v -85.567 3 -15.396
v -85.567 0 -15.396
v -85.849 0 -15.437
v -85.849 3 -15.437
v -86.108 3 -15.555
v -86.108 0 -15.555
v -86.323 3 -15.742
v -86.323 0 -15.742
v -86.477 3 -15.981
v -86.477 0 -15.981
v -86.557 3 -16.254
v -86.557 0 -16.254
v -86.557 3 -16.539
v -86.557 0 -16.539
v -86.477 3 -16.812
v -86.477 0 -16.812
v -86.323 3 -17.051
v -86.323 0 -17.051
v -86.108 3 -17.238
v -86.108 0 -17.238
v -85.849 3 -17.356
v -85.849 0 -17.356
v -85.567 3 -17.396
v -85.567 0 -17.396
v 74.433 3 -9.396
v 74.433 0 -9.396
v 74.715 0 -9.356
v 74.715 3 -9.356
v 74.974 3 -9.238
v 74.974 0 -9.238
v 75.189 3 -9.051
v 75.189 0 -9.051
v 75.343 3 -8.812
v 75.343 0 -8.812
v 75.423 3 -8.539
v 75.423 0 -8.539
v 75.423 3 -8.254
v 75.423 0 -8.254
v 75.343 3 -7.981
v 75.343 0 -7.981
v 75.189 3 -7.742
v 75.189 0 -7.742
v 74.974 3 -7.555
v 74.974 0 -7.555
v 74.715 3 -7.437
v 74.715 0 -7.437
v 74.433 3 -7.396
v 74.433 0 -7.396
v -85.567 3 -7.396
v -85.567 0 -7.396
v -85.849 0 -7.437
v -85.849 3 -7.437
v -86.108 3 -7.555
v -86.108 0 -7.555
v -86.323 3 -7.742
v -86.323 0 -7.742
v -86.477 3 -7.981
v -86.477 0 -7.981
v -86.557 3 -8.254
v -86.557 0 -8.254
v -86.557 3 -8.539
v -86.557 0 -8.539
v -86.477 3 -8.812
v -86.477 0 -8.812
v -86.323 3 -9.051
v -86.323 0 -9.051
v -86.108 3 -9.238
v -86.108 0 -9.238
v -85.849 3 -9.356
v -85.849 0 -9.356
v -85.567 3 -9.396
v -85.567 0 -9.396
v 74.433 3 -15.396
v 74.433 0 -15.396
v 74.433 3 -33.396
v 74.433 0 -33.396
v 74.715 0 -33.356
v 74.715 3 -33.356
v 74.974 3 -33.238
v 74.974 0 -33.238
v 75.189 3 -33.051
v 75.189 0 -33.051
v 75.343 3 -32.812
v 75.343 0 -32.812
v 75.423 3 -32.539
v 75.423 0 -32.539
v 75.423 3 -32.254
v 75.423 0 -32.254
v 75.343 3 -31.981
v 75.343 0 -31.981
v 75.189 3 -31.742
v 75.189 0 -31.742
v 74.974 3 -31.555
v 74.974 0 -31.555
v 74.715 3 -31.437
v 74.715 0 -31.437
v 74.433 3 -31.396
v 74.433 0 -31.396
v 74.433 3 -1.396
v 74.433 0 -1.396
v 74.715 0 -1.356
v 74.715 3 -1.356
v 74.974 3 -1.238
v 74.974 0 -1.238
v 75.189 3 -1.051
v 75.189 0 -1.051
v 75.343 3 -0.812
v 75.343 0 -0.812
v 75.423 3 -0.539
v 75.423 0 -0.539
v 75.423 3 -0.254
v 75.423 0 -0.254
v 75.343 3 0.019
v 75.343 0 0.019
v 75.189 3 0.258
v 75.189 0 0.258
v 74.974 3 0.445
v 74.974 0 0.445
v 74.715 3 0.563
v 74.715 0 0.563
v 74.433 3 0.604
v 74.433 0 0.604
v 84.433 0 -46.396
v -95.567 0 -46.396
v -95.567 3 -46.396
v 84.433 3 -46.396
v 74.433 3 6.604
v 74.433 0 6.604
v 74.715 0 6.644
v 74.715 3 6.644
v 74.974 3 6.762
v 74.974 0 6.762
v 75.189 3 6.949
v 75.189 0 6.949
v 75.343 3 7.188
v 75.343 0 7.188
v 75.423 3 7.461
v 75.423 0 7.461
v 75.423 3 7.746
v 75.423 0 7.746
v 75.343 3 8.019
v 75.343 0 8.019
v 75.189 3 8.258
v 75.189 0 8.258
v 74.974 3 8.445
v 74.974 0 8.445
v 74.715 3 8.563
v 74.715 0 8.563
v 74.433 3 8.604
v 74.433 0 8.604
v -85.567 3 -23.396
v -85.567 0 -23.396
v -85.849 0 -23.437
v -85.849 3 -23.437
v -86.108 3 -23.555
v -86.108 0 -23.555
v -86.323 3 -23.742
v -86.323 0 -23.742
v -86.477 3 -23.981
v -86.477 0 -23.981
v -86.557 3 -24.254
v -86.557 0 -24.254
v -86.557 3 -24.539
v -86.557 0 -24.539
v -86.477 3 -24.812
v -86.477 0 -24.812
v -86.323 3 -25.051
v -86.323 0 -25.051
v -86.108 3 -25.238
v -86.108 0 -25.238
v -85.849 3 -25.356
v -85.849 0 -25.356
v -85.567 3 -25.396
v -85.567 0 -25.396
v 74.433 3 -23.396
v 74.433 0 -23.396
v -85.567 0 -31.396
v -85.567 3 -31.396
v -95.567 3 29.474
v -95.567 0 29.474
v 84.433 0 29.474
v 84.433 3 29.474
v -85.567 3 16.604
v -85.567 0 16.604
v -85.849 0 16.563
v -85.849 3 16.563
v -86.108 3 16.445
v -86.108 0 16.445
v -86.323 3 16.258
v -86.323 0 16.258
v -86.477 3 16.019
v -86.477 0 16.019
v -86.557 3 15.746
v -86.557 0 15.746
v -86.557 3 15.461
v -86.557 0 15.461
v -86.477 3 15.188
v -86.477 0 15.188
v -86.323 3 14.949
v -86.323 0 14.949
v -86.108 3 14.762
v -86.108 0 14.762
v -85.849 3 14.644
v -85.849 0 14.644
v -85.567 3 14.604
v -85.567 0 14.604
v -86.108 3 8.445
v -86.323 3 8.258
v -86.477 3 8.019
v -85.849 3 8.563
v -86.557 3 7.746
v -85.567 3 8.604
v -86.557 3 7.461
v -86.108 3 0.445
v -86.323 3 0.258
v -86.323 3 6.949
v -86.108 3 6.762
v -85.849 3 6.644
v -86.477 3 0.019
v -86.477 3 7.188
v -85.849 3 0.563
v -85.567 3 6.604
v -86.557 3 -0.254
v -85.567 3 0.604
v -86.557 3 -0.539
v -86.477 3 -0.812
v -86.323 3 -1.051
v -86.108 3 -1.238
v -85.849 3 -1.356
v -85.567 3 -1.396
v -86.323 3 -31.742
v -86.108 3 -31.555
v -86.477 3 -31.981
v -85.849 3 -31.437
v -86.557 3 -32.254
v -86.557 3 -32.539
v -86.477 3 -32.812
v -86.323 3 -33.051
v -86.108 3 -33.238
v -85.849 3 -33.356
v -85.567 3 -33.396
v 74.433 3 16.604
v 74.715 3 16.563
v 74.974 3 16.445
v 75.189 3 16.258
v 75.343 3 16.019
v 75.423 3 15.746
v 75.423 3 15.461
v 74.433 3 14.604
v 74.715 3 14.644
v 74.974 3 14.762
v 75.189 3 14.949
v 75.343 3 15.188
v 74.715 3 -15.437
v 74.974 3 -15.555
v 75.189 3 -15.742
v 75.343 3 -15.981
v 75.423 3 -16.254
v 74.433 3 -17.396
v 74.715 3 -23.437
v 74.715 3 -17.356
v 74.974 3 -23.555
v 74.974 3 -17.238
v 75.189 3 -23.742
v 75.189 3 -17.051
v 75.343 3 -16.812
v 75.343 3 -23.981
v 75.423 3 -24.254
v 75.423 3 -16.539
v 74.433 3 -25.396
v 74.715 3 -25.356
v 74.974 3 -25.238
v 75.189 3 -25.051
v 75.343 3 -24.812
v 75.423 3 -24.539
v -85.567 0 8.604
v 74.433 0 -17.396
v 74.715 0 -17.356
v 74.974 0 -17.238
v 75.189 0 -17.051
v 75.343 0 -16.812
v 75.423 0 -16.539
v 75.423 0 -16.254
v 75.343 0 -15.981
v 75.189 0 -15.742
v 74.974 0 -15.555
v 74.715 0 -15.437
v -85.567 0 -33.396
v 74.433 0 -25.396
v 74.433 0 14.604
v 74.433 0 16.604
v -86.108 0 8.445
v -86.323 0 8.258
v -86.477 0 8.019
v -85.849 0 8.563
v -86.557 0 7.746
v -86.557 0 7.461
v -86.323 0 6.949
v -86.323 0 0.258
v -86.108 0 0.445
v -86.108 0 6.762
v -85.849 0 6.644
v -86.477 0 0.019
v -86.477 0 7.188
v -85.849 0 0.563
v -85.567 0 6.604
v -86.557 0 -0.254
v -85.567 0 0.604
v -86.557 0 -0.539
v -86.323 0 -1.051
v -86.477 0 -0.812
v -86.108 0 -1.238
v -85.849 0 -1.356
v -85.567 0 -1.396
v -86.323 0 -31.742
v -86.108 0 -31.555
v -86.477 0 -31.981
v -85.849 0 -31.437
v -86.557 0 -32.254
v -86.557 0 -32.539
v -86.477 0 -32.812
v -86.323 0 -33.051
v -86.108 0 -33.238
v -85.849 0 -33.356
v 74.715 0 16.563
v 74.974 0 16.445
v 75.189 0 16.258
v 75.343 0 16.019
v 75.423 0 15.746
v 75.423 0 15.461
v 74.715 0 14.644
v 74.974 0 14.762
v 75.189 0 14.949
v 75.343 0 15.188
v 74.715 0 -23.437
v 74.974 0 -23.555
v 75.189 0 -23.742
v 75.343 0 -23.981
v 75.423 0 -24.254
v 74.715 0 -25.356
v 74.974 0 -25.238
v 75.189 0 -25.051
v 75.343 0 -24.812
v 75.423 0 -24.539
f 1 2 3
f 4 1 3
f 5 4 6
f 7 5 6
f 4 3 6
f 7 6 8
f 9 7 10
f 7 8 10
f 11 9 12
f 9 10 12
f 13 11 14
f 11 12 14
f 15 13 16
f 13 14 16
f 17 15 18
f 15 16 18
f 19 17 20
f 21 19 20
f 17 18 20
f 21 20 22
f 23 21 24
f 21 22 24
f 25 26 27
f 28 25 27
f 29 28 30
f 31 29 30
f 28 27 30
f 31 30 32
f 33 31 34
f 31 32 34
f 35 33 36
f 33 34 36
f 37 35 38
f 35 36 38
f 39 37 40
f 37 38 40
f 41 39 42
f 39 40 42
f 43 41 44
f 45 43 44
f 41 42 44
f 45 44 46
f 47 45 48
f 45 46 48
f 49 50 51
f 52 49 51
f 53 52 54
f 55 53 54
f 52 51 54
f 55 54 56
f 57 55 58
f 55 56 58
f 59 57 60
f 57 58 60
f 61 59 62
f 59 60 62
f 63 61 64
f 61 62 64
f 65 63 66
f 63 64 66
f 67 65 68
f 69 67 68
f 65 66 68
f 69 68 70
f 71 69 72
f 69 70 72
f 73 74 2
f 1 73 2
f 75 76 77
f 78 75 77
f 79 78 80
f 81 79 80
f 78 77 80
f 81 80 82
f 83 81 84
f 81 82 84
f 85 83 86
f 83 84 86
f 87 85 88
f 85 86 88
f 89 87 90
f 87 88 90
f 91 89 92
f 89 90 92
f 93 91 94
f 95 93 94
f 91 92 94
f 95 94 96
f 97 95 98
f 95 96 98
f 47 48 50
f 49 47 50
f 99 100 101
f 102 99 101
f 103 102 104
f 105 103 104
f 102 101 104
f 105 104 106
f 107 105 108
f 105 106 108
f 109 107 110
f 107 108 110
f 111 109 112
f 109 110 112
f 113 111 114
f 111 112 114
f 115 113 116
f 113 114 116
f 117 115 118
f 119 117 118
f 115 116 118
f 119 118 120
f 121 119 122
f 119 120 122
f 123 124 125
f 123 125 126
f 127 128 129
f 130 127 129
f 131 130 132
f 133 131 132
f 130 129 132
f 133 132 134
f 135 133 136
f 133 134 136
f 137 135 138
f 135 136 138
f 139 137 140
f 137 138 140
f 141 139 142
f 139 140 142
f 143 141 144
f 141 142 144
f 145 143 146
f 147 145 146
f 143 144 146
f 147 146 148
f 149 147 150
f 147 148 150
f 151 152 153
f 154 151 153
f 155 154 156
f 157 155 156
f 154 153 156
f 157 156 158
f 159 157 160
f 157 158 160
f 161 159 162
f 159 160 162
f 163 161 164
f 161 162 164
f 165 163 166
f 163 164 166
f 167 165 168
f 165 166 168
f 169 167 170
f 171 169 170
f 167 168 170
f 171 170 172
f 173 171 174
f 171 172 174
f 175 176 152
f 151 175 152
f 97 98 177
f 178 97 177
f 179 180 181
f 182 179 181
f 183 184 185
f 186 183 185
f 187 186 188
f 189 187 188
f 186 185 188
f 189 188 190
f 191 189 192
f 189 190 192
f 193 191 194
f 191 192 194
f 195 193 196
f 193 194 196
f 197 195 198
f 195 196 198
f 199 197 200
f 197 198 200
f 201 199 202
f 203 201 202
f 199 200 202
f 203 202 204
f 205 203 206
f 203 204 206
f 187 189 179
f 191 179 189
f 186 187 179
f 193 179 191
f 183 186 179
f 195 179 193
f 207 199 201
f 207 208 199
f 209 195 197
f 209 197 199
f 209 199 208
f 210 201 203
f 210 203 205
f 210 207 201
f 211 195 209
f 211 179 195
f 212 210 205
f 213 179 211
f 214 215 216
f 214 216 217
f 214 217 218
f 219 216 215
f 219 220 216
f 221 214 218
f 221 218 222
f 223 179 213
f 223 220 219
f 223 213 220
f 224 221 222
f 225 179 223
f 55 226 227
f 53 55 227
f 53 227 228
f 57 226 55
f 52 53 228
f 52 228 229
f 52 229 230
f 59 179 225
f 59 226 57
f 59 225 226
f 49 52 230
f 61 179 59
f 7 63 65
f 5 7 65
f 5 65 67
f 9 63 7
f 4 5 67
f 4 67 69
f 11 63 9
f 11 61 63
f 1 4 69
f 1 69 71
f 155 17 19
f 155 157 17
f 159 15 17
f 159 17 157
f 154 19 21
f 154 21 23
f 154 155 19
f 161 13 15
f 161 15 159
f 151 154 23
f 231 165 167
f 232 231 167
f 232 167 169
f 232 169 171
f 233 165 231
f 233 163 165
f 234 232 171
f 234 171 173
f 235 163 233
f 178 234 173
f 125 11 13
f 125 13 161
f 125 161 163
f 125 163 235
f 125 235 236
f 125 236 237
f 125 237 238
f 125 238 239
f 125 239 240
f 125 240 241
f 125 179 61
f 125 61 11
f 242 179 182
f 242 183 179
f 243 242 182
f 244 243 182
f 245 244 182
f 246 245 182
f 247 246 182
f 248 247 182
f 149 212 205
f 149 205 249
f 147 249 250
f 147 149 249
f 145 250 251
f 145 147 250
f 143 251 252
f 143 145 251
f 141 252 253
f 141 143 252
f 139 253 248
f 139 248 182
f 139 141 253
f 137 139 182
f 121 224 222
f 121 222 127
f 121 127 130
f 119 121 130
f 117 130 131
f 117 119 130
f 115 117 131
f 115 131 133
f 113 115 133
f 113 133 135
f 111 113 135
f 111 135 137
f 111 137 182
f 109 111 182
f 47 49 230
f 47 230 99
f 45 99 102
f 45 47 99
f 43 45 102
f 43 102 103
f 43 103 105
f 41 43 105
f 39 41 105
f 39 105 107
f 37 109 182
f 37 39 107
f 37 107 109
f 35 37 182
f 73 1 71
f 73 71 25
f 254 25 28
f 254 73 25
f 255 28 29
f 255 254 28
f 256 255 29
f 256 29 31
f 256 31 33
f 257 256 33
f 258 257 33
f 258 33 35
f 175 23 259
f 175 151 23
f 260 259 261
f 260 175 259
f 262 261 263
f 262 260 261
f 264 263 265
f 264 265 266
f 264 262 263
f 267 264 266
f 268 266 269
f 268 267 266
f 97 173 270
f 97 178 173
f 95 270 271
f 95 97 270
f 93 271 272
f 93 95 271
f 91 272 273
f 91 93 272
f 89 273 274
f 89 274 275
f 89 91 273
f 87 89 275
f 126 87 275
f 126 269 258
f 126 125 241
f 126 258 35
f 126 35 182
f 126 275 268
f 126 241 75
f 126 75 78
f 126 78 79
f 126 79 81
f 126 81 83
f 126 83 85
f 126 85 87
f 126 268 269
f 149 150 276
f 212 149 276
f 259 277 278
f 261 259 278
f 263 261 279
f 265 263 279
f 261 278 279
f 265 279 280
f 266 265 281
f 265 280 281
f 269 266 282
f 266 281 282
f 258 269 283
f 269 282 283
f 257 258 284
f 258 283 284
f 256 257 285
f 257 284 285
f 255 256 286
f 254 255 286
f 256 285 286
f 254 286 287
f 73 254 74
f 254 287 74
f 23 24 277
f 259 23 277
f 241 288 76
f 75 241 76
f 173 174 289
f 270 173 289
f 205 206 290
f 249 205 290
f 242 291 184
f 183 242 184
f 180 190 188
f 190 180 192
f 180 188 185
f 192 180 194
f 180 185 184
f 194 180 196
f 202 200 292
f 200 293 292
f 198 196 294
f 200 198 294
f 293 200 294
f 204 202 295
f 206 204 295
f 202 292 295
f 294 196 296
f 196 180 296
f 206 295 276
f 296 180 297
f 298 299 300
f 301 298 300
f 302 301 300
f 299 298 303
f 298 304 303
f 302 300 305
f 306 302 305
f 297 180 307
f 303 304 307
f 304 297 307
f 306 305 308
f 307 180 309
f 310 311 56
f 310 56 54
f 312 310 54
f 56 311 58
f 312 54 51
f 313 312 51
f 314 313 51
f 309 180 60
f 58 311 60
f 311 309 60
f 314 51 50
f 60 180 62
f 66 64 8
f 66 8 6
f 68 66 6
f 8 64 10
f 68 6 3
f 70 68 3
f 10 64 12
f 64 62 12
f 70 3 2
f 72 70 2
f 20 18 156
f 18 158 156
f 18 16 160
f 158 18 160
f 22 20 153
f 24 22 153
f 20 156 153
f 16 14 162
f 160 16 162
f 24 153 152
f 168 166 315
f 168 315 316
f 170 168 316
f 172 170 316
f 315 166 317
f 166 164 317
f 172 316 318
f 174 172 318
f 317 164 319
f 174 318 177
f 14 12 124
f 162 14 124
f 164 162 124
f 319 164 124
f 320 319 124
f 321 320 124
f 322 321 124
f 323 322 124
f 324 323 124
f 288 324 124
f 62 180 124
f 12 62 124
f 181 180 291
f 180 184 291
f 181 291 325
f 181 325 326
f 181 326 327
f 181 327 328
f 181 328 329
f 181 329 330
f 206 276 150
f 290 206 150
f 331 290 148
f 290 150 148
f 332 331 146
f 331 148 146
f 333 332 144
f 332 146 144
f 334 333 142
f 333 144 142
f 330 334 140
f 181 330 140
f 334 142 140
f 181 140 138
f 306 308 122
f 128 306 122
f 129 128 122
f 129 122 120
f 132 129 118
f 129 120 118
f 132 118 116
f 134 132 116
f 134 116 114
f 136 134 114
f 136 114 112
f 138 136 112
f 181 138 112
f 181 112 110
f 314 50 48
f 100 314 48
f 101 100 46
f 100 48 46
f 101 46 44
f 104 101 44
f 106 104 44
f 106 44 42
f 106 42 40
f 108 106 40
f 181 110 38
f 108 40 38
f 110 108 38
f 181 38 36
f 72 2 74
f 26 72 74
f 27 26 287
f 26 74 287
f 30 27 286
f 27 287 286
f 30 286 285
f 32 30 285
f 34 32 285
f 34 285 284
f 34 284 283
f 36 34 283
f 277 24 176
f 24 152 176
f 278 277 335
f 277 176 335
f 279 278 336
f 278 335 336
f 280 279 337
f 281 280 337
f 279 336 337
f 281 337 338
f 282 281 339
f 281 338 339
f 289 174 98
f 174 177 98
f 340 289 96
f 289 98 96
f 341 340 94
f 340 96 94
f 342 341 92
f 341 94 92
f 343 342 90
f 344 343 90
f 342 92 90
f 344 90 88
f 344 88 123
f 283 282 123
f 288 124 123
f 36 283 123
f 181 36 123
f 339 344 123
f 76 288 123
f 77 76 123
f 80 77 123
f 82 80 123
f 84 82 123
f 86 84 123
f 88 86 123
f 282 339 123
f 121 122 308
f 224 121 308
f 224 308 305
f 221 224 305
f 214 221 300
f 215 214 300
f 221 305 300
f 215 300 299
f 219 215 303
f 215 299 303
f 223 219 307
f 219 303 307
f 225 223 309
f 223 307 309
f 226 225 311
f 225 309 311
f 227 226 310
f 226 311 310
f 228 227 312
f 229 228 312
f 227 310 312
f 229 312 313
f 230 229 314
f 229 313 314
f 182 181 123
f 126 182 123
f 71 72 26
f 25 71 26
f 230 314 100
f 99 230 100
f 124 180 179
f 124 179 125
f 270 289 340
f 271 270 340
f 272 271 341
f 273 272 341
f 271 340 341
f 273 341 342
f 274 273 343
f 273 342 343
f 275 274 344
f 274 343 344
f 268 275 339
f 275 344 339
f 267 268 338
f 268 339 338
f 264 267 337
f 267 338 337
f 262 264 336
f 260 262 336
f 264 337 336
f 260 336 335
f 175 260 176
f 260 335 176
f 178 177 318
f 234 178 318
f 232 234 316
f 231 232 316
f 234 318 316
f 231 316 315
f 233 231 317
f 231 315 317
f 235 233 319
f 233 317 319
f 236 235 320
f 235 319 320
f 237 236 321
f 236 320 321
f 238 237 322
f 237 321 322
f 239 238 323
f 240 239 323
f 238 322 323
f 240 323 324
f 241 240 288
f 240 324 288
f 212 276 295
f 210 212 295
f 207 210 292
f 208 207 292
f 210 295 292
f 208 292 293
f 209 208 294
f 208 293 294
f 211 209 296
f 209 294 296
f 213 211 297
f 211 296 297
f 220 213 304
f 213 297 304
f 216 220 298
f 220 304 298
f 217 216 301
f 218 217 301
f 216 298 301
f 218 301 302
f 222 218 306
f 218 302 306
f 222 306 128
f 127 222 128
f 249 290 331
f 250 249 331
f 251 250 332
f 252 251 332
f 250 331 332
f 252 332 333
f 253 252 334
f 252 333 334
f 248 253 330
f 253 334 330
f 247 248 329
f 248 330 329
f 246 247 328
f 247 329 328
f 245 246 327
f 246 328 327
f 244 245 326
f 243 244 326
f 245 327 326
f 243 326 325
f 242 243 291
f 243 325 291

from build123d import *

# Parameters (mm, degrees)
SKETCH1_W           = 180
SKETCH1_H           = 75.87
BOSS_EXTRUDE1_DEPTH = 3


with BuildPart() as part:
    # Sketch1 → Boss-Extrude1 (new body)
    with BuildSketch(Plane(origin=(0, 0, 0), x_dir=(1, 0, 0), z_dir=(0, 1, 0))):
        with Locations((-5.566969943, 8.461475771)):
            Rectangle(SKETCH1_W, SKETCH1_H)
        with BuildLine():
            Line((-85.566969943, 25.396475771), (74.433030057, 25.396475771))
            ThreePointArc((74.433030057, 25.396475771), (75.433030057, 24.396475771), (74.433030057, 23.396475771))
            Line((74.433030057, 23.396475771), (-85.566969943, 23.396475771))
            ThreePointArc((-85.566969943, 23.396475771), (-86.566969943, 24.396475771), (-85.566969943, 25.396475771))
        make_face(mode=Mode.SUBTRACT)
        with BuildLine():
            Line((-85.566969943, 33.396475771), (74.433030057, 33.396475771))
            ThreePointArc((74.433030057, 33.396475771), (75.433030057, 32.396475771), (74.433030057, 31.396475771))
            Line((74.433030057, 31.396475771), (-85.566969943, 31.396475771))
            ThreePointArc((-85.566969943, 31.396475771), (-86.566969943, 32.396475771), (-85.566969943, 33.396475771))
        make_face(mode=Mode.SUBTRACT)
        with BuildLine():
            Line((-85.566969943, 17.396475771), (74.433030057, 17.396475771))
            ThreePointArc((74.433030057, 17.396475771), (75.433030057, 16.396475771), (74.433030057, 15.396475771))
            Line((74.433030057, 15.396475771), (-85.566969943, 15.396475771))
            ThreePointArc((-85.566969943, 15.396475771), (-86.566969943, 16.396475771), (-85.566969943, 17.396475771))
        make_face(mode=Mode.SUBTRACT)
        with BuildLine():
            Line((-85.566969943, 9.396475771), (74.433030057, 9.396475771))
            ThreePointArc((74.433030057, 9.396475771), (75.433030057, 8.396475771), (74.433030057, 7.396475771))
            Line((74.433030057, 7.396475771), (-85.566969943, 7.396475771))
            ThreePointArc((-85.566969943, 7.396475771), (-86.566969943, 8.396475771), (-85.566969943, 9.396475771))
        make_face(mode=Mode.SUBTRACT)
        with BuildLine():
            Line((-85.566969943, 1.396475771), (74.433030057, 1.396475771))
            ThreePointArc((74.433030057, 1.396475771), (75.433030057, 0.396475771), (74.433030057, -0.603524229))
            Line((74.433030057, -0.603524229), (-85.566969943, -0.603524229))
            ThreePointArc((-85.566969943, -0.603524229), (-86.566969943, 0.396475771), (-85.566969943, 1.396475771))
        make_face(mode=Mode.SUBTRACT)
        with BuildLine():
            Line((-85.566969943, -6.603524229), (74.433030057, -6.603524229))
            ThreePointArc((74.433030057, -6.603524229), (75.433030057, -7.603524229), (74.433030057, -8.603524229))
            Line((74.433030057, -8.603524229), (-85.566969943, -8.603524229))
            ThreePointArc((-85.566969943, -8.603524229), (-86.566969943, -7.603524229), (-85.566969943, -6.603524229))
        make_face(mode=Mode.SUBTRACT)
        with BuildLine():
            Line((-85.566969943, -14.603524229), (74.433030057, -14.603524229))
            ThreePointArc((74.433030057, -14.603524229), (75.433030057, -15.603524229), (74.433030057, -16.603524229))
            Line((74.433030057, -16.603524229), (-85.566969943, -16.603524229))
            ThreePointArc((-85.566969943, -16.603524229), (-86.566969943, -15.603524229), (-85.566969943, -14.603524229))
        make_face(mode=Mode.SUBTRACT)
    extrude(amount=BOSS_EXTRUDE1_DEPTH)


solid = part.part
